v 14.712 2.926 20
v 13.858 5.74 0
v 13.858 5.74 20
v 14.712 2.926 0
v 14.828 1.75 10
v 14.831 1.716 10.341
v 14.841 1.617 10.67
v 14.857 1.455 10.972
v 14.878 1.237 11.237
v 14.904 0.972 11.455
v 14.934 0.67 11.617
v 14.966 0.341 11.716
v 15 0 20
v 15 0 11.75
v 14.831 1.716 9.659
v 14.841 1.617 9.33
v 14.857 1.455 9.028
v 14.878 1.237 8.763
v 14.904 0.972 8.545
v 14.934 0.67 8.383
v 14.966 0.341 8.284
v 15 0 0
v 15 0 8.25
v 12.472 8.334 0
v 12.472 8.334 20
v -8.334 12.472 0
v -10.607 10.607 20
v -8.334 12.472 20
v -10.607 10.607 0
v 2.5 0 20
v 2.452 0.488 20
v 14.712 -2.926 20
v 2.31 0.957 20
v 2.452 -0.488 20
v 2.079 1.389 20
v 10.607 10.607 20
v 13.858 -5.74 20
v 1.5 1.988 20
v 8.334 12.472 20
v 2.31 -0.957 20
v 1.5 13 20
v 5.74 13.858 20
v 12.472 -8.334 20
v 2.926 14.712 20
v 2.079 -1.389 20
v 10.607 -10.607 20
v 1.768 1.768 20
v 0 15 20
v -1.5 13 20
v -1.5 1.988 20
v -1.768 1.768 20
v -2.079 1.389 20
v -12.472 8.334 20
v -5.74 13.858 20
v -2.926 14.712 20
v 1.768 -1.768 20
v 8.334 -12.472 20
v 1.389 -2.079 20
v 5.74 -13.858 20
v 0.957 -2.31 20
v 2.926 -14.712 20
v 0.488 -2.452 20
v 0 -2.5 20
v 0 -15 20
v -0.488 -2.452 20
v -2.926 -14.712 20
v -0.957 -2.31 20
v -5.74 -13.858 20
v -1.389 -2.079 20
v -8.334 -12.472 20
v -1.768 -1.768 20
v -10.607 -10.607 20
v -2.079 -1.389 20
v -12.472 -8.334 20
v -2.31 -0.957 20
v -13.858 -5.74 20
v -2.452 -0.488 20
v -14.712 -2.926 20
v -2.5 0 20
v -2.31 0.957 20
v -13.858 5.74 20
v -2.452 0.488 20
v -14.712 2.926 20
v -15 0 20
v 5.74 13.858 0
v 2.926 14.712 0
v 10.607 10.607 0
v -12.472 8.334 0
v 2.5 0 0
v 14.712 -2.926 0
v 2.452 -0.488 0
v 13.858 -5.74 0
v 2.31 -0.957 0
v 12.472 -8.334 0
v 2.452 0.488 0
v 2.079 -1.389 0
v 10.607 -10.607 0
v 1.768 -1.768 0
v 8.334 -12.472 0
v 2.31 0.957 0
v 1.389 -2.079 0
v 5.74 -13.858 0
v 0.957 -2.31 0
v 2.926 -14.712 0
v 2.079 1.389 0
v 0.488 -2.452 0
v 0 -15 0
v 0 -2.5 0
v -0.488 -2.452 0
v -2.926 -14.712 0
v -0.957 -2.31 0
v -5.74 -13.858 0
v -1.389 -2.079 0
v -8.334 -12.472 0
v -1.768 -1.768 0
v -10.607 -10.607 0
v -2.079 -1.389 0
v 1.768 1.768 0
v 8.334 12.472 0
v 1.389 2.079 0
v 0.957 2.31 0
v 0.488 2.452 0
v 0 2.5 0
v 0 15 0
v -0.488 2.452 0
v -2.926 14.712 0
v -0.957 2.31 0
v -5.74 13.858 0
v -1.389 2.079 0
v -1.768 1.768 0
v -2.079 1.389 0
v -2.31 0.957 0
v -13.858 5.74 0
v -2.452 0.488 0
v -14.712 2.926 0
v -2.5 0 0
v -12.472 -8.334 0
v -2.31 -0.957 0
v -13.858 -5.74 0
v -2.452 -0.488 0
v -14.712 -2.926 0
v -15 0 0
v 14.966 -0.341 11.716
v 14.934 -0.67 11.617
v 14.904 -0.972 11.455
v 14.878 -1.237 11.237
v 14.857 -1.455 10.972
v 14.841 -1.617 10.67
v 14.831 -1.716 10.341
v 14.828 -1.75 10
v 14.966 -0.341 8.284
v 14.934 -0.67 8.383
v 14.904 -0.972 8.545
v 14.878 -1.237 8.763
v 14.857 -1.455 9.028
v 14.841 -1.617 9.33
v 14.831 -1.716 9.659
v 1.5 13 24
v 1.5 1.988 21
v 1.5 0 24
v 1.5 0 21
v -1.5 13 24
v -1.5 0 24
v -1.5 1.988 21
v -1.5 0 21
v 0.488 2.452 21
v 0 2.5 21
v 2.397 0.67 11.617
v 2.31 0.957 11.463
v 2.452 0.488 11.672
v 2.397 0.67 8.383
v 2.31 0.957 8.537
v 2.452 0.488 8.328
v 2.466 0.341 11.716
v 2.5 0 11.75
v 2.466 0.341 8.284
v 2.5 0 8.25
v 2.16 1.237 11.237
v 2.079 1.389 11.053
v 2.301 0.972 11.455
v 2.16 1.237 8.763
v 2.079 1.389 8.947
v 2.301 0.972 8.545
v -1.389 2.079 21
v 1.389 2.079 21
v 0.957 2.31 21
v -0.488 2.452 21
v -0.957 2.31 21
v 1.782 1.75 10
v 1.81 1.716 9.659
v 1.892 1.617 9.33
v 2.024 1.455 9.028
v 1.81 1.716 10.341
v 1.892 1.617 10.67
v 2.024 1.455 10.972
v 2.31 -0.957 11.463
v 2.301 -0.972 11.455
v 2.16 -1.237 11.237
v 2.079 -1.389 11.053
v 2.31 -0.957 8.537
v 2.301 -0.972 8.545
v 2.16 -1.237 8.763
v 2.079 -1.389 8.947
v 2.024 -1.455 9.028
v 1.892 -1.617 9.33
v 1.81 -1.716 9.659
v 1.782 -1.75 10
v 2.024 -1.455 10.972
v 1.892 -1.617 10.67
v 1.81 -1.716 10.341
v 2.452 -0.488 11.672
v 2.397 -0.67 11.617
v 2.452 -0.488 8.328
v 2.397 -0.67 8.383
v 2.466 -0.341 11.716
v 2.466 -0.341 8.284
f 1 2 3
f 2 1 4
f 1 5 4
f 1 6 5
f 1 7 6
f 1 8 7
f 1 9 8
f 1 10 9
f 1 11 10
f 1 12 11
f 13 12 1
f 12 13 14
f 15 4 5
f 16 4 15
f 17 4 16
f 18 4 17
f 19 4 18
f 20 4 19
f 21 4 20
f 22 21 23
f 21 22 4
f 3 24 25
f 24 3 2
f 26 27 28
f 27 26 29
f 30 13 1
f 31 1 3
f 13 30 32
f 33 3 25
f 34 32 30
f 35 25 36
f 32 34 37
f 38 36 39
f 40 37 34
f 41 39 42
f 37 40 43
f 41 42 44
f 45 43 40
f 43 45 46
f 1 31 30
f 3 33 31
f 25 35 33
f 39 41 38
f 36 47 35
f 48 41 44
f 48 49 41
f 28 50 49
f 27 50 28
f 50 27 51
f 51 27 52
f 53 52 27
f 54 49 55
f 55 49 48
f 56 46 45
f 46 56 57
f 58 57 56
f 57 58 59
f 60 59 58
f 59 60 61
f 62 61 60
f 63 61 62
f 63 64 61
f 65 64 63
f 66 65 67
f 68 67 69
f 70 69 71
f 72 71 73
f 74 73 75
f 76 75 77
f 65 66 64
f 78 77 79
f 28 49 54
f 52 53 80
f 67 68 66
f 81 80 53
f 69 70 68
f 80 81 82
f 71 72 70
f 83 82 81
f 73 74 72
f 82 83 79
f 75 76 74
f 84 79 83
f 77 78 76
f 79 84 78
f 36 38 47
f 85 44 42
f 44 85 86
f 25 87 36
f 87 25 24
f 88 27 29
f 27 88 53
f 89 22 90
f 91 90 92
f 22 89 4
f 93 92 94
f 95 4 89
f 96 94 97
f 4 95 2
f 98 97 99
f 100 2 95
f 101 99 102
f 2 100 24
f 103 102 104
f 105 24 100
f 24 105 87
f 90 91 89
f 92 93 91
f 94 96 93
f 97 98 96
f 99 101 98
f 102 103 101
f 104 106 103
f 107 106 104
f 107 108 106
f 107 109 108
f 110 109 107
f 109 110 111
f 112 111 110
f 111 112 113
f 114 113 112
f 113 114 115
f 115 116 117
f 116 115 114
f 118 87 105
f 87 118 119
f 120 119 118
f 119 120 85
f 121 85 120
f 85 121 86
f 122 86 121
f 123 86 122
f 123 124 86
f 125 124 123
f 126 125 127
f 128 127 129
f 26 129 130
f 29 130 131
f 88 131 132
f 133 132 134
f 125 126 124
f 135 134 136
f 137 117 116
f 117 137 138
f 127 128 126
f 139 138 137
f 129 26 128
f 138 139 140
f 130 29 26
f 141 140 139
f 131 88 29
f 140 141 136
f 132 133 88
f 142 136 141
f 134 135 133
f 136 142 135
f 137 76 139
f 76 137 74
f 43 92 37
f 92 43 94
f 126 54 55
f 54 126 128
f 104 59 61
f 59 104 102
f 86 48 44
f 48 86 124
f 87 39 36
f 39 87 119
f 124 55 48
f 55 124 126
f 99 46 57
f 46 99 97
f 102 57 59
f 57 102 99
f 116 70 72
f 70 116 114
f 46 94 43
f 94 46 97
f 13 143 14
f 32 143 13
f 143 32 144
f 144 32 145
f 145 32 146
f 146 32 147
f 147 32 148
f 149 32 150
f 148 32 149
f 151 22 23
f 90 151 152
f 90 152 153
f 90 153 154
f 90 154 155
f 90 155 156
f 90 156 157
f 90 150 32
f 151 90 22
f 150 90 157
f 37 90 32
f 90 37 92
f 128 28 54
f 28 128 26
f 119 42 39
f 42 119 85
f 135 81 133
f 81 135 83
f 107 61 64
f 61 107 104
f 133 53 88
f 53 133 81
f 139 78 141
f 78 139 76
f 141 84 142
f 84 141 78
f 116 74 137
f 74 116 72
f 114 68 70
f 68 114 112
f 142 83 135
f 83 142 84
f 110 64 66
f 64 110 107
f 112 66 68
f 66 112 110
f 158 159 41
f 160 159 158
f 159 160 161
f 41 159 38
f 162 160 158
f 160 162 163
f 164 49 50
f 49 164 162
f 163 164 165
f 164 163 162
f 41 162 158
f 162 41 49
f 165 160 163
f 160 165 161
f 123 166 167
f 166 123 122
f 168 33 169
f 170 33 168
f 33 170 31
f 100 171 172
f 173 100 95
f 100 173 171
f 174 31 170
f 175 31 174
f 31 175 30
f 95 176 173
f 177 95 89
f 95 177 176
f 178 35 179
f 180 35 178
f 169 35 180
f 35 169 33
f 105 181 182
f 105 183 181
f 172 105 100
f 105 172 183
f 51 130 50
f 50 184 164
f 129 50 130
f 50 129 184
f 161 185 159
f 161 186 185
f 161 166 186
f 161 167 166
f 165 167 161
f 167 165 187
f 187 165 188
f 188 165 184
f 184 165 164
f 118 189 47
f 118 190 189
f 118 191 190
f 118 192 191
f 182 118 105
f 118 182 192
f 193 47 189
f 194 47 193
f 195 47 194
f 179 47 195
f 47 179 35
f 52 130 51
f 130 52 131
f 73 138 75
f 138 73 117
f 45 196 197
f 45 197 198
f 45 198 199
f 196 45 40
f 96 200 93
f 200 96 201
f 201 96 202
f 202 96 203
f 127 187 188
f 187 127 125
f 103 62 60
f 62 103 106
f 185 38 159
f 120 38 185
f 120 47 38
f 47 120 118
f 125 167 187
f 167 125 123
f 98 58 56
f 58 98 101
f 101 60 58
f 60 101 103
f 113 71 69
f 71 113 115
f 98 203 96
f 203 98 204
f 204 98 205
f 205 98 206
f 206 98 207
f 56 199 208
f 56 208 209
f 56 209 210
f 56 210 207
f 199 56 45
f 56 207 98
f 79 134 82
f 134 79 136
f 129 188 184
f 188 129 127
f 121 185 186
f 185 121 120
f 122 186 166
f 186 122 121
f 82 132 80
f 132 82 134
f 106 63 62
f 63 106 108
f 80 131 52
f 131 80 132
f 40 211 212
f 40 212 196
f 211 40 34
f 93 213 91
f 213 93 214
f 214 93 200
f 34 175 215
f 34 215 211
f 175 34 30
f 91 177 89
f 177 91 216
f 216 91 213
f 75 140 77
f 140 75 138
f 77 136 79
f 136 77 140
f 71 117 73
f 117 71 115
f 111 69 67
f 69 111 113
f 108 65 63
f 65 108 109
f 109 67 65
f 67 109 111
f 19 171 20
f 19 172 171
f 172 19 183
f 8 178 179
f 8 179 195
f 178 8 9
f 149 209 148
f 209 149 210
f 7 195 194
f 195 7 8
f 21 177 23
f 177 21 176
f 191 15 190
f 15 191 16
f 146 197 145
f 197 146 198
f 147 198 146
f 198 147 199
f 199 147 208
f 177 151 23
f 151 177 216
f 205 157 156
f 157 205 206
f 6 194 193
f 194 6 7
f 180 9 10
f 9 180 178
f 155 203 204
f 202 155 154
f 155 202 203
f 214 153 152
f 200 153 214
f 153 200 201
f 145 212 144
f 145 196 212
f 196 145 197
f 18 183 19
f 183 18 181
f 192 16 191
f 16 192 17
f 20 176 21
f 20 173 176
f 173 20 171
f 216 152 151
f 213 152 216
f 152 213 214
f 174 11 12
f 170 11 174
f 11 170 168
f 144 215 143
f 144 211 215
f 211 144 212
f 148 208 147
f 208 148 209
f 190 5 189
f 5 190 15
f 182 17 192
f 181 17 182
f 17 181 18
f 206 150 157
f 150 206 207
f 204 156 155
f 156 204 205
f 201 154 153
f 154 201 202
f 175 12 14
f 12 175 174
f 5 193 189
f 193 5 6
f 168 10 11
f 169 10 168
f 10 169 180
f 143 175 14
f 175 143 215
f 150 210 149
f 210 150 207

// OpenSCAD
$fn = 32;

// ----------------------------------------------------------------------
// Control knob: pointer knob
// ----------------------------------------------------------------------

// --- parameters (mm) ---
rib_w = 3;                // pointer rib width
rib_h = 5;                // pointer rib height
knob_d = 30;              // knob body diameter
knob_h = 20;              // knob body height
bore_d = 5;               // shaft bore diameter
set_d = 3.5;              // set screw bore diameter
fit_tol = 0.1;            // tolerance for press fits, mm
free_tol = 0.5;           // tolerance for clearance fits, mm

rib_poke = rib_h - 1;  // rib height above the top
total_h = knob_h + rib_h - 1;  // overall height

difference() {
  union() {
    cylinder(h = knob_h, d = knob_d);
    translate([-rib_w / 2, 0, knob_h - 1])
      cube([rib_w, knob_d / 2 - 2, rib_h]);
  }
  translate([0, 0, -1]) cylinder(h = knob_h + 2, d = bore_d);
  translate([-1, 0, knob_h / 2]) rotate([0, 90, 0])
    cylinder(h = knob_d / 2 + bore_d / 2 + 2, d = set_d);}
